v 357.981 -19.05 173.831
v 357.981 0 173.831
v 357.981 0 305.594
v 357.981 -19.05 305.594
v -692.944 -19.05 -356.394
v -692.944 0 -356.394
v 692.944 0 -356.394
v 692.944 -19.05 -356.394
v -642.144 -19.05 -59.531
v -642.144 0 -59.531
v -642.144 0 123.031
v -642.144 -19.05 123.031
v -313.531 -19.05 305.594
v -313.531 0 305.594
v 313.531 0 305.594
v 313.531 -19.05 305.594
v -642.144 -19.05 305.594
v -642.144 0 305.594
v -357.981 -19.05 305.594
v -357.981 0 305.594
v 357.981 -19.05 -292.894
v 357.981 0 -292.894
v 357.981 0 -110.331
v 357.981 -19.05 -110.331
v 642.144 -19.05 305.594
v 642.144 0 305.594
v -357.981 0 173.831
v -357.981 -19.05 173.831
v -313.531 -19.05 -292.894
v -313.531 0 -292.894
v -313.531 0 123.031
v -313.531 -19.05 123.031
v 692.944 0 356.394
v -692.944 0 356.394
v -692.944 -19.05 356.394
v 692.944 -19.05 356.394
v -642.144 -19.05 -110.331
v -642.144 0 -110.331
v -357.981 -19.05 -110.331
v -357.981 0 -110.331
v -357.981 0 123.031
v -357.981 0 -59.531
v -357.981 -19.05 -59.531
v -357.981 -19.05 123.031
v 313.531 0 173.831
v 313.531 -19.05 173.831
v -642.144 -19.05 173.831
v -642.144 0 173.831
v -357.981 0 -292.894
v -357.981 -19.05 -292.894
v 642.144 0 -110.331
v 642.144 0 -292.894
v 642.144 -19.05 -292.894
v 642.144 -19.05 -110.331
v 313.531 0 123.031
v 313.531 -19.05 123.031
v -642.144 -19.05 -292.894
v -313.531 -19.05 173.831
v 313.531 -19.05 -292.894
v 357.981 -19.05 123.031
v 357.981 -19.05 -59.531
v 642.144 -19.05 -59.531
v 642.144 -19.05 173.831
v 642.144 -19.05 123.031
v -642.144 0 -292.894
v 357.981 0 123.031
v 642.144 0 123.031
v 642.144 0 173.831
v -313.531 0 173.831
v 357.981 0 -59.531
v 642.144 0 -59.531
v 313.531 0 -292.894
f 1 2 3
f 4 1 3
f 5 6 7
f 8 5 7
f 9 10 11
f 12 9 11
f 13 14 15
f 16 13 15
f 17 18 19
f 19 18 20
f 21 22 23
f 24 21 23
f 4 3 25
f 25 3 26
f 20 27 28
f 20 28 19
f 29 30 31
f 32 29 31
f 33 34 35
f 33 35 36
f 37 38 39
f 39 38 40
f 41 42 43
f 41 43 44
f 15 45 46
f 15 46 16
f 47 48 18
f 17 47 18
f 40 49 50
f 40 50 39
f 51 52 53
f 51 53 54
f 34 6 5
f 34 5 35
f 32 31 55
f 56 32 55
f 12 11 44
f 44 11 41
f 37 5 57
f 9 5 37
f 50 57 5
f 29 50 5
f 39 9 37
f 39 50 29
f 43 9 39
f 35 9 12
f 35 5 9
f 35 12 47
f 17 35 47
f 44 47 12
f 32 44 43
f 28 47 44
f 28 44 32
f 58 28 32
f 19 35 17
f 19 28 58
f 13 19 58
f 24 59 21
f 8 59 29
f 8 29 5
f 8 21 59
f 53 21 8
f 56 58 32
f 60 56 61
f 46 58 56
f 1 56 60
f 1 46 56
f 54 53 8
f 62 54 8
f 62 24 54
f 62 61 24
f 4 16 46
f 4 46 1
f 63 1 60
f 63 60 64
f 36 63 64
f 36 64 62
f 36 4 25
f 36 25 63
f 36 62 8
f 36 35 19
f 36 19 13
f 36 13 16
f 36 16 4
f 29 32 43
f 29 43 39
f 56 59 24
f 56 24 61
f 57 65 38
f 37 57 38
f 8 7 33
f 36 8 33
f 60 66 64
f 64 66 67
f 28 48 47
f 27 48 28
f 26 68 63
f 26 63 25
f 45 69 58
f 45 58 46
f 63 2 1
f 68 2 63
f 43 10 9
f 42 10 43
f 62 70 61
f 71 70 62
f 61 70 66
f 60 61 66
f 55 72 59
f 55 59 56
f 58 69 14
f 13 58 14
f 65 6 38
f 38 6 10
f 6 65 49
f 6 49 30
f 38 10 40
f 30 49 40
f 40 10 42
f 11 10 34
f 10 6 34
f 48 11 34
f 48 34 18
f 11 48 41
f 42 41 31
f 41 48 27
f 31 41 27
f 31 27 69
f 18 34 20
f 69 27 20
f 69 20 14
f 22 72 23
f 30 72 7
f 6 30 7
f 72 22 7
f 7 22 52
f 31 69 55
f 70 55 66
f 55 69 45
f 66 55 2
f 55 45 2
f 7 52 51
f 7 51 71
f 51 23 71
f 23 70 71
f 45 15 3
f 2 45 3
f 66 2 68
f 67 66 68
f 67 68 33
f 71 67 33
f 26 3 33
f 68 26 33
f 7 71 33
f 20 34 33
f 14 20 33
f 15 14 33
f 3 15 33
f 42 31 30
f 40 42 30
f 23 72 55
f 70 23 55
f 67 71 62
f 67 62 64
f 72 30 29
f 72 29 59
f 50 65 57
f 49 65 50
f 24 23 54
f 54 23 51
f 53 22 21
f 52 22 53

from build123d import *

# Parameters (mm, degrees)
F0_W     = 1385.8875
F0_H     = 712.7875
F0_W_2   = 284.1625
F0_H_2   = 182.5625
F0_W_3   = 627.0625
F0_H_3   = 415.925
F0_H_4   = 131.7625
F1_DEPTH = 19.05


with BuildPart() as f1:
    # F0 (on Front) → F1 (new body)
    with BuildSketch(Plane.XZ):
        Rectangle(F0_W, F0_H)
        with Locations((-500.0625, -201.6125)):
            Rectangle(F0_W_2, F0_H_2, mode=Mode.SUBTRACT)
        with Locations((0, -84.93125)):
            Rectangle(F0_W_3, F0_H_3, mode=Mode.SUBTRACT)
        with Locations((500.0625, -201.6125)):
            Rectangle(F0_W_2, F0_H_2, mode=Mode.SUBTRACT)
        with Locations((-500.0625, 31.75)):
            Rectangle(F0_W_2, F0_H_2, mode=Mode.SUBTRACT)
        with Locations((-500.0625, 239.7125)):
            Rectangle(F0_W_2, F0_H_4, mode=Mode.SUBTRACT)
        with Locations((0, 239.7125)):
            Rectangle(F0_W_3, F0_H_4, mode=Mode.SUBTRACT)
        with Locations((500.0625, 31.75)):
            Rectangle(F0_W_2, F0_H_2, mode=Mode.SUBTRACT)
        with Locations((500.0625, 239.7125)):
            Rectangle(F0_W_2, F0_H_4, mode=Mode.SUBTRACT)
    extrude(amount=F1_DEPTH)


solid = f1.part
